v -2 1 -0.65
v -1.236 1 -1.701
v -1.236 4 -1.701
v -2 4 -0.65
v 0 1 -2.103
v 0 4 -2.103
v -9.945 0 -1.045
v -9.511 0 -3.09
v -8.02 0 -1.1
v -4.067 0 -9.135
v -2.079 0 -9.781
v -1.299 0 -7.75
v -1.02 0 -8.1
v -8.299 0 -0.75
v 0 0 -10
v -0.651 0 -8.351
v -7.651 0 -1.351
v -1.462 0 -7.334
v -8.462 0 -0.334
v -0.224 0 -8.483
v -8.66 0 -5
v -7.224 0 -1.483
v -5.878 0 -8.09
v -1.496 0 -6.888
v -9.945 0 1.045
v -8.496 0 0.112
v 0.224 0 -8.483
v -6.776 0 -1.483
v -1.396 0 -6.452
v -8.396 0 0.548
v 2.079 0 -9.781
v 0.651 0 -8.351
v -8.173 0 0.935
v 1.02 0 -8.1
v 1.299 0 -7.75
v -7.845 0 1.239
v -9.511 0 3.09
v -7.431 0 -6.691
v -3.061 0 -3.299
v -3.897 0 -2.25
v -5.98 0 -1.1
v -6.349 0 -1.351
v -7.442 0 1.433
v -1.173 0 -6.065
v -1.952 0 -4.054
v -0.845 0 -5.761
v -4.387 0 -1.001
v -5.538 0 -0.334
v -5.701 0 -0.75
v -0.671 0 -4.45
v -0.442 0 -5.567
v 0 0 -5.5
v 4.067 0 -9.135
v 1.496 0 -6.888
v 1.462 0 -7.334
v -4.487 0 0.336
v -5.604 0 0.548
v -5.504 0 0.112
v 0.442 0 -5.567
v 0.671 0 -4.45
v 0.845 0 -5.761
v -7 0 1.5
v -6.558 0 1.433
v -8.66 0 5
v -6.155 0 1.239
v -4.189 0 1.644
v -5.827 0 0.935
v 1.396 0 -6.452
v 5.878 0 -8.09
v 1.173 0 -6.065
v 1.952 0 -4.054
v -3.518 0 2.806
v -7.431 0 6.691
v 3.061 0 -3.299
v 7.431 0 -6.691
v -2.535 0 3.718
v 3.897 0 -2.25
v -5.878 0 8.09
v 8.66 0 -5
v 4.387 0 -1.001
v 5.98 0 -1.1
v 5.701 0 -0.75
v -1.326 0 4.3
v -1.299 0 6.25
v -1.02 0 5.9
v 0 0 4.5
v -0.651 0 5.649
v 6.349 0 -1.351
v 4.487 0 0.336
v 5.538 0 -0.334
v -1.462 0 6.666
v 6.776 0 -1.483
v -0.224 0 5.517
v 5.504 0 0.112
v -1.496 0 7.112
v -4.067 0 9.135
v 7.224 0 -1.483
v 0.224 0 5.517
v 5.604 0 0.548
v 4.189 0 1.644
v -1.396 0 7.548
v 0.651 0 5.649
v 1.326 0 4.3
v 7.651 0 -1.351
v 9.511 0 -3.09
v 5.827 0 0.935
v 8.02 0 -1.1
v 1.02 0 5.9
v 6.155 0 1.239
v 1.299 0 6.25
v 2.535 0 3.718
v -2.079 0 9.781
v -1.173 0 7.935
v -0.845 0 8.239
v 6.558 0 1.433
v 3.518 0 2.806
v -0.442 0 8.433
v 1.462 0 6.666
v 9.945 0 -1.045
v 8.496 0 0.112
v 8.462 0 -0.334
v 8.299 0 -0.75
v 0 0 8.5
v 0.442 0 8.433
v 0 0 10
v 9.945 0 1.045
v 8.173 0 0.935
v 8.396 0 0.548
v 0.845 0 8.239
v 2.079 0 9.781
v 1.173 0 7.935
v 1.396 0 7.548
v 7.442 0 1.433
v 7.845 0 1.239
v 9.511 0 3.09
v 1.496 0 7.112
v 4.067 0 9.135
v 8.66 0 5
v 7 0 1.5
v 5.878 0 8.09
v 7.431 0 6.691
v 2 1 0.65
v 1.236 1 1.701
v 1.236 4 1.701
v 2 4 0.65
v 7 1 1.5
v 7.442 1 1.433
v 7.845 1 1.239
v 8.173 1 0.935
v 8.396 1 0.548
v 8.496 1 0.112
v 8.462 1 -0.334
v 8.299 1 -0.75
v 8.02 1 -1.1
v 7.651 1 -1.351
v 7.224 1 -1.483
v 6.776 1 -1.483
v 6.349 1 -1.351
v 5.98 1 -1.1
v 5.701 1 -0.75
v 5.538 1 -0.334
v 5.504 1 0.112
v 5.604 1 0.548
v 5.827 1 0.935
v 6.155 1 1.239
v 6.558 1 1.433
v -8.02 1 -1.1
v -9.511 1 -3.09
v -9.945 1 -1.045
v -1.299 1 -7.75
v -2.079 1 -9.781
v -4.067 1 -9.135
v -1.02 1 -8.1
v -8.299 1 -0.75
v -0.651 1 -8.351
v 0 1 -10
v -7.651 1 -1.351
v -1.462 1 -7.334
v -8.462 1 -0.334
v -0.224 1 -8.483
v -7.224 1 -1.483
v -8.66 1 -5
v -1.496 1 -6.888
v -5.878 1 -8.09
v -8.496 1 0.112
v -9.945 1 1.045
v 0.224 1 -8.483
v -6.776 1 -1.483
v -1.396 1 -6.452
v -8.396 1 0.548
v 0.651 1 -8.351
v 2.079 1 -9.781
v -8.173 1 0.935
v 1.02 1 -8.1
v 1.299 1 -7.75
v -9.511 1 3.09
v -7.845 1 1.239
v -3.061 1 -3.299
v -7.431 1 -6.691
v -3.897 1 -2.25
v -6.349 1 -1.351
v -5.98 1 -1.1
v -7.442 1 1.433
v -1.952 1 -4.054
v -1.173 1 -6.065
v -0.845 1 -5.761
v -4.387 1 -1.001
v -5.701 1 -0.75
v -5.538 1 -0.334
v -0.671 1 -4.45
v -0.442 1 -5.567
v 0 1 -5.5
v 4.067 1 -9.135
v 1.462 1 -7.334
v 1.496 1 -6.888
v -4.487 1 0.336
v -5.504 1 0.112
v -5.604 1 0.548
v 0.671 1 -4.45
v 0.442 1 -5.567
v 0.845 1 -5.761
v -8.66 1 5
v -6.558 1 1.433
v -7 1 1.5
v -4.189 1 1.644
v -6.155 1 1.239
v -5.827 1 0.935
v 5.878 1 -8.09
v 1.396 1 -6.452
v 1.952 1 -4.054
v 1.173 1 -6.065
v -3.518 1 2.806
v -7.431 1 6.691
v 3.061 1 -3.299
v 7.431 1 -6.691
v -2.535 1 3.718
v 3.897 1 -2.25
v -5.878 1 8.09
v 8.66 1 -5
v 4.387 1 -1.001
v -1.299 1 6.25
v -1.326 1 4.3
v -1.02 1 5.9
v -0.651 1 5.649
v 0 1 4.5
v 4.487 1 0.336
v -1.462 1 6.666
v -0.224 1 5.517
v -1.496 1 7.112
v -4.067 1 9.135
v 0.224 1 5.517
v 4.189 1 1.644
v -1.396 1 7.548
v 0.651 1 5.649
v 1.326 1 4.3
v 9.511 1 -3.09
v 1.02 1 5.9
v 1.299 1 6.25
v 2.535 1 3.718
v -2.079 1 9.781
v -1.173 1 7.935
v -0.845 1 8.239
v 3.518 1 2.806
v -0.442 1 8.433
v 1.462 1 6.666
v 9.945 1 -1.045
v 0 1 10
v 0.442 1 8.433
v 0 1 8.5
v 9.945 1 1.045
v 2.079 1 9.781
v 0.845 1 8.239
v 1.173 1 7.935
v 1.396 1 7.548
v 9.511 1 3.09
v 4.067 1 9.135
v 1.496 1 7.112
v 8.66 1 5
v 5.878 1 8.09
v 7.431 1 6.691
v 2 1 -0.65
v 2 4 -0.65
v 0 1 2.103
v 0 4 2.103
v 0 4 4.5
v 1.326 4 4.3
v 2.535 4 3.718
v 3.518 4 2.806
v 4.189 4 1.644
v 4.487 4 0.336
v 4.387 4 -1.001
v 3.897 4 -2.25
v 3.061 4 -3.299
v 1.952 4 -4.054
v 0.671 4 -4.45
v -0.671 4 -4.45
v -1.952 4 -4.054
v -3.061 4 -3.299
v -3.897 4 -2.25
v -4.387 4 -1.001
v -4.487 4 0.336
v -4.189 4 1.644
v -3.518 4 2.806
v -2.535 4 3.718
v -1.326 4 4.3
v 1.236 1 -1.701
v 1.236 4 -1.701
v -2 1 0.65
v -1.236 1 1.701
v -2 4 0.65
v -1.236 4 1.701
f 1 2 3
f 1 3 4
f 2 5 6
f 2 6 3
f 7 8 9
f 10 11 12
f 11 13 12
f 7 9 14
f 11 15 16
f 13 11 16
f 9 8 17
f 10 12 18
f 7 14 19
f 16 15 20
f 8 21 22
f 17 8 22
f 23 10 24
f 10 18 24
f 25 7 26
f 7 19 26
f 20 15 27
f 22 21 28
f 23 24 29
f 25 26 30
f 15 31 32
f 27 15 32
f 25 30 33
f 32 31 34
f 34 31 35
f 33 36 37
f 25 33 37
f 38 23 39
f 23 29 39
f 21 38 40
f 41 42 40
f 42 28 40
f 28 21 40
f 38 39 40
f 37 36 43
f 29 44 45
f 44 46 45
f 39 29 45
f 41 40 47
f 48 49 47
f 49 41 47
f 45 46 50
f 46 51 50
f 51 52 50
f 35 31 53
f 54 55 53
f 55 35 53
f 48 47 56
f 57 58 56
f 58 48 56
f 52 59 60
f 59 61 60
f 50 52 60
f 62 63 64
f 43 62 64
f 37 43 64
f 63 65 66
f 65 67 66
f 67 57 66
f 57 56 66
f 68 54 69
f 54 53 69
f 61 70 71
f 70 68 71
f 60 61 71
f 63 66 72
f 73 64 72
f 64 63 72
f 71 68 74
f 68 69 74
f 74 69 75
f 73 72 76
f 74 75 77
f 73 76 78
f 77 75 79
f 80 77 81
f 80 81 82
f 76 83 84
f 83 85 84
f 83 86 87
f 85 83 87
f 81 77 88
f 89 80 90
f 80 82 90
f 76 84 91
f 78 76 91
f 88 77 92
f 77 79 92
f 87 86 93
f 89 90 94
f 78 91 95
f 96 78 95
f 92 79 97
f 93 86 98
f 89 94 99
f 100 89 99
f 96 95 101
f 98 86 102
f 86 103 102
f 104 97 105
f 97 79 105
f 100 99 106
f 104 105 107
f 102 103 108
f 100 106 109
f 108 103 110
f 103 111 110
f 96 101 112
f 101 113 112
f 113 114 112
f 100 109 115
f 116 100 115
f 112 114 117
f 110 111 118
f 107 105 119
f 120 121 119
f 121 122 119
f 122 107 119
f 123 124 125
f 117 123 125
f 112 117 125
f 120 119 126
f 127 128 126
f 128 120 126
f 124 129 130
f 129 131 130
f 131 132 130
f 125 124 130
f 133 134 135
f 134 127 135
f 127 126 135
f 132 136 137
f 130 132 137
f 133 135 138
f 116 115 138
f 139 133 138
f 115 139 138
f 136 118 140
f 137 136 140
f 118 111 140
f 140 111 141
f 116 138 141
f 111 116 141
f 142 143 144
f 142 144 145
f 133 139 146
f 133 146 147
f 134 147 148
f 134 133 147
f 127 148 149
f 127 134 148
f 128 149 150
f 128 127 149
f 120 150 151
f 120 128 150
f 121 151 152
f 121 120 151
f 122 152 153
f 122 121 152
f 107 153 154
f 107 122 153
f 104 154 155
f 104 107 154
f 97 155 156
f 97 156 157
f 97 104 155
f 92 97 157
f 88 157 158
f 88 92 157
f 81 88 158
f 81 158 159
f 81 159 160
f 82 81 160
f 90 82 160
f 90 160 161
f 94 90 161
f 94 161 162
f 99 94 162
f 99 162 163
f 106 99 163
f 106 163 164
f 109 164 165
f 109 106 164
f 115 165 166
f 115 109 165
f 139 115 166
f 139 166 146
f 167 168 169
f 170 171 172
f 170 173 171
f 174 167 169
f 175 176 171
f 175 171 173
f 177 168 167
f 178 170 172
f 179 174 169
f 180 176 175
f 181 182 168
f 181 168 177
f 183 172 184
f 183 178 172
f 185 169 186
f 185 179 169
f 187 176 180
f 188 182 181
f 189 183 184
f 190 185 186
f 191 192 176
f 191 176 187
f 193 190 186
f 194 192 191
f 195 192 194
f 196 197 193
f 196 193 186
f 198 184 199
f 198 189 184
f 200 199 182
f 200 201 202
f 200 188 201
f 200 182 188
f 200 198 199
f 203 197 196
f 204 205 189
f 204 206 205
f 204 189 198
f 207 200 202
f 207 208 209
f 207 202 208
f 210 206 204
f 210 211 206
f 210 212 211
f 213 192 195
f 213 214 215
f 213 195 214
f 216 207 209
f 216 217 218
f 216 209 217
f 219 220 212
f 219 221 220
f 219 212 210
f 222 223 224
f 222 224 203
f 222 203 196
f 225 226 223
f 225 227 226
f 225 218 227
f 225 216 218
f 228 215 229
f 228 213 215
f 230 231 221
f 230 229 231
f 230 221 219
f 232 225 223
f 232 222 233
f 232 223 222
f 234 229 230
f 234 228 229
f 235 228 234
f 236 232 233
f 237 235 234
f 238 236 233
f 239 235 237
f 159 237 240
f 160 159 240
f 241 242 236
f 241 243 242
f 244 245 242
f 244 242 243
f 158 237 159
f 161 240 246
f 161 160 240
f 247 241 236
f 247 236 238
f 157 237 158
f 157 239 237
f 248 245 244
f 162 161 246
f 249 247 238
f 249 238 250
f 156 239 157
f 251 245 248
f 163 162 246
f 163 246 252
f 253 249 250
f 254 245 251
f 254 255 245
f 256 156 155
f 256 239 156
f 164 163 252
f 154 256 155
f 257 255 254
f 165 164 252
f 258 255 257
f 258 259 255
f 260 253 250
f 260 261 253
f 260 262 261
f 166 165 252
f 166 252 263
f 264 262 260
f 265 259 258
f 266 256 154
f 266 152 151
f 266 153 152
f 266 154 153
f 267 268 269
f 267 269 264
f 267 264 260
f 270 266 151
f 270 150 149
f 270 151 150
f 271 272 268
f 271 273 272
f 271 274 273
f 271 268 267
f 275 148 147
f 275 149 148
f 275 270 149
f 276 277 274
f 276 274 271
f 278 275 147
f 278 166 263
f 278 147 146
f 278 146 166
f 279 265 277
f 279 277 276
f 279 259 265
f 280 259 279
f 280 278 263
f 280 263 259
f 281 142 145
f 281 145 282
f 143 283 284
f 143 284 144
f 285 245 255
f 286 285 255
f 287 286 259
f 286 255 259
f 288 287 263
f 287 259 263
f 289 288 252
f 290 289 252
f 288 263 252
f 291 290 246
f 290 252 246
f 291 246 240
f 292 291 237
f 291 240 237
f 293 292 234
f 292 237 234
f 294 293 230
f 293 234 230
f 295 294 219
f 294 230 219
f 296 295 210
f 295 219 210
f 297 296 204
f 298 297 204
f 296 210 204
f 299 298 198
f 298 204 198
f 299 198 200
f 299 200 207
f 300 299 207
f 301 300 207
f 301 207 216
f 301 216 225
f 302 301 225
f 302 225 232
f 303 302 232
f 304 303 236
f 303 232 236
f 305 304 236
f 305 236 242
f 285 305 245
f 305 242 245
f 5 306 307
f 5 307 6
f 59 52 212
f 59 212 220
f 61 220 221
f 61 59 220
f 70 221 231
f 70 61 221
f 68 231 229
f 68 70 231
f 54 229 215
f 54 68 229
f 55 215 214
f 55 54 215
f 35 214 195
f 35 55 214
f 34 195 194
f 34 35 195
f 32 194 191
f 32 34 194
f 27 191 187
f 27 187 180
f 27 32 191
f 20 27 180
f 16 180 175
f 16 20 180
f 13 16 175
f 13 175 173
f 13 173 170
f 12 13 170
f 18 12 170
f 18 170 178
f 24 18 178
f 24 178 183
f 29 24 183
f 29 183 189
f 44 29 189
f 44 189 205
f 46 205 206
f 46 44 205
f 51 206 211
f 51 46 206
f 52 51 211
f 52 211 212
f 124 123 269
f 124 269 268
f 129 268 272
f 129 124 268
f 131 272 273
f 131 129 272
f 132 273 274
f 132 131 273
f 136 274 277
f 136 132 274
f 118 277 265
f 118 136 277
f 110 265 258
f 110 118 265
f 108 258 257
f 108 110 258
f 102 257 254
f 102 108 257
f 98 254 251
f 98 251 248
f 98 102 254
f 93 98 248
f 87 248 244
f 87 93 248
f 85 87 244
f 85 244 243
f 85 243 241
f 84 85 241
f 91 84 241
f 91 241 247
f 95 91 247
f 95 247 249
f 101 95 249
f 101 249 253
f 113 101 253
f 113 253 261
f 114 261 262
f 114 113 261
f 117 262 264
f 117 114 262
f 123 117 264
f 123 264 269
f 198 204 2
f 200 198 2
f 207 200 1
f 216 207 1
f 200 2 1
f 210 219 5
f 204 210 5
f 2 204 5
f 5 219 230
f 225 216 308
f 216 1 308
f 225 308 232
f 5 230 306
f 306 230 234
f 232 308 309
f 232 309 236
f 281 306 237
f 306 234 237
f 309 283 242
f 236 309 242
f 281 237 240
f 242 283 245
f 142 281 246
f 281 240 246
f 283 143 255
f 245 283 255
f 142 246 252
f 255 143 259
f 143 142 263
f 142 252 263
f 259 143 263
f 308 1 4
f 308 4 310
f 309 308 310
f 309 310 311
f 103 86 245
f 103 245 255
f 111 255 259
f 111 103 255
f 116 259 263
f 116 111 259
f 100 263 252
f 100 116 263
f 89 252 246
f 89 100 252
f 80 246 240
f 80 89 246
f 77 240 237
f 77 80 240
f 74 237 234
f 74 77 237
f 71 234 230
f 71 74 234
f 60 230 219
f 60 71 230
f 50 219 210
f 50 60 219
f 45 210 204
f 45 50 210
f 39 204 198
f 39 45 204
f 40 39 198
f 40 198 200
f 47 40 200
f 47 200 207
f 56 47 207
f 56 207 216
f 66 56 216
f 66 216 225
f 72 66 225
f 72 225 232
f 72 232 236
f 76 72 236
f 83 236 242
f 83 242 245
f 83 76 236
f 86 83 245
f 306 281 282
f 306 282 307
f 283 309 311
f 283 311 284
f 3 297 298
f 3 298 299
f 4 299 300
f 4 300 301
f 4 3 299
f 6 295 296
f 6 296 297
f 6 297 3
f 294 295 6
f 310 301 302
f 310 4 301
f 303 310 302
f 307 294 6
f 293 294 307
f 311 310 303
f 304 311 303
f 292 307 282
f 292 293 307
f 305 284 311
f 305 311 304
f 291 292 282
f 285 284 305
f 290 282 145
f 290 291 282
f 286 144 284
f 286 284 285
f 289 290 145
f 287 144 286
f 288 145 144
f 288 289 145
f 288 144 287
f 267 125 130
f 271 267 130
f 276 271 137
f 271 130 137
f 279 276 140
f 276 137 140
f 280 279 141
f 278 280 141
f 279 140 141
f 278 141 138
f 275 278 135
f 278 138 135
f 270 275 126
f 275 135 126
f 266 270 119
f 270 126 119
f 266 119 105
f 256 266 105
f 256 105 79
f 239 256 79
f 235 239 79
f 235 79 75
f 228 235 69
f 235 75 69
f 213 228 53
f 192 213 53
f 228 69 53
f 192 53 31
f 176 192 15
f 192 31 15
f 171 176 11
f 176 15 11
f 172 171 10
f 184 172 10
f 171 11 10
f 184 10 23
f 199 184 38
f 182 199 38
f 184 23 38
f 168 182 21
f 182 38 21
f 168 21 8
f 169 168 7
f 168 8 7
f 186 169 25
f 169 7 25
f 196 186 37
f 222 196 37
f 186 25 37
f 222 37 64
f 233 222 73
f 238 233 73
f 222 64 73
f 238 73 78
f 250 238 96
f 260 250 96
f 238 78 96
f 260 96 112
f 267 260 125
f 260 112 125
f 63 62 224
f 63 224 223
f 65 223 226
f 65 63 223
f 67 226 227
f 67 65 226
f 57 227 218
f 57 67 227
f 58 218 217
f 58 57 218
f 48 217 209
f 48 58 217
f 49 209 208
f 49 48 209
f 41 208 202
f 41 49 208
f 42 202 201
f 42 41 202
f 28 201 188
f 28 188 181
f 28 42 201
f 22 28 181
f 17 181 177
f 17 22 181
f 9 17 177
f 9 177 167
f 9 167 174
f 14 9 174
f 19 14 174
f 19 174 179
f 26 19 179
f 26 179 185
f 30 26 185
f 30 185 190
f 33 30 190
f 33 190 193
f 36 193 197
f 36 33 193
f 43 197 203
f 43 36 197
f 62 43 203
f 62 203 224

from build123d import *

# Parameters (mm, degrees)
SKETCH1_R           = 10
SKETCH1_R_2         = 1.5
SKETCH1_R_3         = 4.5
BOSS_EXTRUDE1_DEPTH = 1
SKETCH2_R           = 4.5
BOSS_EXTRUDE2_DEPTH = 3


with BuildPart() as part:
    # Sketch1 → Boss-Extrude1 (new body)
    with BuildSketch(Plane(origin=(0, 0, 0), x_dir=(1, 0, 0), z_dir=(0, 1, 0))):
        with Locations(Location((0, 0, 0), (0, 0, 270))):
            Circle(SKETCH1_R)
        with Locations(Location((0, 7, 0), (0, 0, 270))):
            Circle(SKETCH1_R_2, mode=Mode.SUBTRACT)
        with Locations(Location((7, 0, 0), (0, 0, 270))):
            Circle(SKETCH1_R_2, mode=Mode.SUBTRACT)
        with Locations(Location((0, -7, 0), (0, 0, 270))):
            Circle(SKETCH1_R_2, mode=Mode.SUBTRACT)
        with Locations(Location((-7, 0, 0), (0, 0, 270))):
            Circle(SKETCH1_R_2, mode=Mode.SUBTRACT)
        with Locations(Location((0, 0, 0), (0, 0, 270))):
            Circle(SKETCH1_R_3, mode=Mode.SUBTRACT)
    extrude(amount=BOSS_EXTRUDE1_DEPTH)


with BuildPart() as body_2:
    # Sketch2 → Boss-Extrude2 (new body)
    with BuildSketch(Plane(origin=(0, 1, 0), x_dir=(1, 0, 0), z_dir=(0, 1, 0))):
        with Locations(Location((0, 0, 0), (0, 0, 270))):
            Circle(SKETCH2_R)
        Polygon((2, 0.649839392), (1.236067977, 1.701301617), (0, 2.102924448), (-1.236067977, 1.701301617), (-2, 0.649839392), (-2, -0.649839392), (-1.236067977, -1.701301617), (0, -2.102924448), (1.236067977, -1.701301617), (2, -0.649839392), align=None, mode=Mode.SUBTRACT)
    extrude(amount=BOSS_EXTRUDE2_DEPTH)


solid = Compound([part.part, body_2.part])
